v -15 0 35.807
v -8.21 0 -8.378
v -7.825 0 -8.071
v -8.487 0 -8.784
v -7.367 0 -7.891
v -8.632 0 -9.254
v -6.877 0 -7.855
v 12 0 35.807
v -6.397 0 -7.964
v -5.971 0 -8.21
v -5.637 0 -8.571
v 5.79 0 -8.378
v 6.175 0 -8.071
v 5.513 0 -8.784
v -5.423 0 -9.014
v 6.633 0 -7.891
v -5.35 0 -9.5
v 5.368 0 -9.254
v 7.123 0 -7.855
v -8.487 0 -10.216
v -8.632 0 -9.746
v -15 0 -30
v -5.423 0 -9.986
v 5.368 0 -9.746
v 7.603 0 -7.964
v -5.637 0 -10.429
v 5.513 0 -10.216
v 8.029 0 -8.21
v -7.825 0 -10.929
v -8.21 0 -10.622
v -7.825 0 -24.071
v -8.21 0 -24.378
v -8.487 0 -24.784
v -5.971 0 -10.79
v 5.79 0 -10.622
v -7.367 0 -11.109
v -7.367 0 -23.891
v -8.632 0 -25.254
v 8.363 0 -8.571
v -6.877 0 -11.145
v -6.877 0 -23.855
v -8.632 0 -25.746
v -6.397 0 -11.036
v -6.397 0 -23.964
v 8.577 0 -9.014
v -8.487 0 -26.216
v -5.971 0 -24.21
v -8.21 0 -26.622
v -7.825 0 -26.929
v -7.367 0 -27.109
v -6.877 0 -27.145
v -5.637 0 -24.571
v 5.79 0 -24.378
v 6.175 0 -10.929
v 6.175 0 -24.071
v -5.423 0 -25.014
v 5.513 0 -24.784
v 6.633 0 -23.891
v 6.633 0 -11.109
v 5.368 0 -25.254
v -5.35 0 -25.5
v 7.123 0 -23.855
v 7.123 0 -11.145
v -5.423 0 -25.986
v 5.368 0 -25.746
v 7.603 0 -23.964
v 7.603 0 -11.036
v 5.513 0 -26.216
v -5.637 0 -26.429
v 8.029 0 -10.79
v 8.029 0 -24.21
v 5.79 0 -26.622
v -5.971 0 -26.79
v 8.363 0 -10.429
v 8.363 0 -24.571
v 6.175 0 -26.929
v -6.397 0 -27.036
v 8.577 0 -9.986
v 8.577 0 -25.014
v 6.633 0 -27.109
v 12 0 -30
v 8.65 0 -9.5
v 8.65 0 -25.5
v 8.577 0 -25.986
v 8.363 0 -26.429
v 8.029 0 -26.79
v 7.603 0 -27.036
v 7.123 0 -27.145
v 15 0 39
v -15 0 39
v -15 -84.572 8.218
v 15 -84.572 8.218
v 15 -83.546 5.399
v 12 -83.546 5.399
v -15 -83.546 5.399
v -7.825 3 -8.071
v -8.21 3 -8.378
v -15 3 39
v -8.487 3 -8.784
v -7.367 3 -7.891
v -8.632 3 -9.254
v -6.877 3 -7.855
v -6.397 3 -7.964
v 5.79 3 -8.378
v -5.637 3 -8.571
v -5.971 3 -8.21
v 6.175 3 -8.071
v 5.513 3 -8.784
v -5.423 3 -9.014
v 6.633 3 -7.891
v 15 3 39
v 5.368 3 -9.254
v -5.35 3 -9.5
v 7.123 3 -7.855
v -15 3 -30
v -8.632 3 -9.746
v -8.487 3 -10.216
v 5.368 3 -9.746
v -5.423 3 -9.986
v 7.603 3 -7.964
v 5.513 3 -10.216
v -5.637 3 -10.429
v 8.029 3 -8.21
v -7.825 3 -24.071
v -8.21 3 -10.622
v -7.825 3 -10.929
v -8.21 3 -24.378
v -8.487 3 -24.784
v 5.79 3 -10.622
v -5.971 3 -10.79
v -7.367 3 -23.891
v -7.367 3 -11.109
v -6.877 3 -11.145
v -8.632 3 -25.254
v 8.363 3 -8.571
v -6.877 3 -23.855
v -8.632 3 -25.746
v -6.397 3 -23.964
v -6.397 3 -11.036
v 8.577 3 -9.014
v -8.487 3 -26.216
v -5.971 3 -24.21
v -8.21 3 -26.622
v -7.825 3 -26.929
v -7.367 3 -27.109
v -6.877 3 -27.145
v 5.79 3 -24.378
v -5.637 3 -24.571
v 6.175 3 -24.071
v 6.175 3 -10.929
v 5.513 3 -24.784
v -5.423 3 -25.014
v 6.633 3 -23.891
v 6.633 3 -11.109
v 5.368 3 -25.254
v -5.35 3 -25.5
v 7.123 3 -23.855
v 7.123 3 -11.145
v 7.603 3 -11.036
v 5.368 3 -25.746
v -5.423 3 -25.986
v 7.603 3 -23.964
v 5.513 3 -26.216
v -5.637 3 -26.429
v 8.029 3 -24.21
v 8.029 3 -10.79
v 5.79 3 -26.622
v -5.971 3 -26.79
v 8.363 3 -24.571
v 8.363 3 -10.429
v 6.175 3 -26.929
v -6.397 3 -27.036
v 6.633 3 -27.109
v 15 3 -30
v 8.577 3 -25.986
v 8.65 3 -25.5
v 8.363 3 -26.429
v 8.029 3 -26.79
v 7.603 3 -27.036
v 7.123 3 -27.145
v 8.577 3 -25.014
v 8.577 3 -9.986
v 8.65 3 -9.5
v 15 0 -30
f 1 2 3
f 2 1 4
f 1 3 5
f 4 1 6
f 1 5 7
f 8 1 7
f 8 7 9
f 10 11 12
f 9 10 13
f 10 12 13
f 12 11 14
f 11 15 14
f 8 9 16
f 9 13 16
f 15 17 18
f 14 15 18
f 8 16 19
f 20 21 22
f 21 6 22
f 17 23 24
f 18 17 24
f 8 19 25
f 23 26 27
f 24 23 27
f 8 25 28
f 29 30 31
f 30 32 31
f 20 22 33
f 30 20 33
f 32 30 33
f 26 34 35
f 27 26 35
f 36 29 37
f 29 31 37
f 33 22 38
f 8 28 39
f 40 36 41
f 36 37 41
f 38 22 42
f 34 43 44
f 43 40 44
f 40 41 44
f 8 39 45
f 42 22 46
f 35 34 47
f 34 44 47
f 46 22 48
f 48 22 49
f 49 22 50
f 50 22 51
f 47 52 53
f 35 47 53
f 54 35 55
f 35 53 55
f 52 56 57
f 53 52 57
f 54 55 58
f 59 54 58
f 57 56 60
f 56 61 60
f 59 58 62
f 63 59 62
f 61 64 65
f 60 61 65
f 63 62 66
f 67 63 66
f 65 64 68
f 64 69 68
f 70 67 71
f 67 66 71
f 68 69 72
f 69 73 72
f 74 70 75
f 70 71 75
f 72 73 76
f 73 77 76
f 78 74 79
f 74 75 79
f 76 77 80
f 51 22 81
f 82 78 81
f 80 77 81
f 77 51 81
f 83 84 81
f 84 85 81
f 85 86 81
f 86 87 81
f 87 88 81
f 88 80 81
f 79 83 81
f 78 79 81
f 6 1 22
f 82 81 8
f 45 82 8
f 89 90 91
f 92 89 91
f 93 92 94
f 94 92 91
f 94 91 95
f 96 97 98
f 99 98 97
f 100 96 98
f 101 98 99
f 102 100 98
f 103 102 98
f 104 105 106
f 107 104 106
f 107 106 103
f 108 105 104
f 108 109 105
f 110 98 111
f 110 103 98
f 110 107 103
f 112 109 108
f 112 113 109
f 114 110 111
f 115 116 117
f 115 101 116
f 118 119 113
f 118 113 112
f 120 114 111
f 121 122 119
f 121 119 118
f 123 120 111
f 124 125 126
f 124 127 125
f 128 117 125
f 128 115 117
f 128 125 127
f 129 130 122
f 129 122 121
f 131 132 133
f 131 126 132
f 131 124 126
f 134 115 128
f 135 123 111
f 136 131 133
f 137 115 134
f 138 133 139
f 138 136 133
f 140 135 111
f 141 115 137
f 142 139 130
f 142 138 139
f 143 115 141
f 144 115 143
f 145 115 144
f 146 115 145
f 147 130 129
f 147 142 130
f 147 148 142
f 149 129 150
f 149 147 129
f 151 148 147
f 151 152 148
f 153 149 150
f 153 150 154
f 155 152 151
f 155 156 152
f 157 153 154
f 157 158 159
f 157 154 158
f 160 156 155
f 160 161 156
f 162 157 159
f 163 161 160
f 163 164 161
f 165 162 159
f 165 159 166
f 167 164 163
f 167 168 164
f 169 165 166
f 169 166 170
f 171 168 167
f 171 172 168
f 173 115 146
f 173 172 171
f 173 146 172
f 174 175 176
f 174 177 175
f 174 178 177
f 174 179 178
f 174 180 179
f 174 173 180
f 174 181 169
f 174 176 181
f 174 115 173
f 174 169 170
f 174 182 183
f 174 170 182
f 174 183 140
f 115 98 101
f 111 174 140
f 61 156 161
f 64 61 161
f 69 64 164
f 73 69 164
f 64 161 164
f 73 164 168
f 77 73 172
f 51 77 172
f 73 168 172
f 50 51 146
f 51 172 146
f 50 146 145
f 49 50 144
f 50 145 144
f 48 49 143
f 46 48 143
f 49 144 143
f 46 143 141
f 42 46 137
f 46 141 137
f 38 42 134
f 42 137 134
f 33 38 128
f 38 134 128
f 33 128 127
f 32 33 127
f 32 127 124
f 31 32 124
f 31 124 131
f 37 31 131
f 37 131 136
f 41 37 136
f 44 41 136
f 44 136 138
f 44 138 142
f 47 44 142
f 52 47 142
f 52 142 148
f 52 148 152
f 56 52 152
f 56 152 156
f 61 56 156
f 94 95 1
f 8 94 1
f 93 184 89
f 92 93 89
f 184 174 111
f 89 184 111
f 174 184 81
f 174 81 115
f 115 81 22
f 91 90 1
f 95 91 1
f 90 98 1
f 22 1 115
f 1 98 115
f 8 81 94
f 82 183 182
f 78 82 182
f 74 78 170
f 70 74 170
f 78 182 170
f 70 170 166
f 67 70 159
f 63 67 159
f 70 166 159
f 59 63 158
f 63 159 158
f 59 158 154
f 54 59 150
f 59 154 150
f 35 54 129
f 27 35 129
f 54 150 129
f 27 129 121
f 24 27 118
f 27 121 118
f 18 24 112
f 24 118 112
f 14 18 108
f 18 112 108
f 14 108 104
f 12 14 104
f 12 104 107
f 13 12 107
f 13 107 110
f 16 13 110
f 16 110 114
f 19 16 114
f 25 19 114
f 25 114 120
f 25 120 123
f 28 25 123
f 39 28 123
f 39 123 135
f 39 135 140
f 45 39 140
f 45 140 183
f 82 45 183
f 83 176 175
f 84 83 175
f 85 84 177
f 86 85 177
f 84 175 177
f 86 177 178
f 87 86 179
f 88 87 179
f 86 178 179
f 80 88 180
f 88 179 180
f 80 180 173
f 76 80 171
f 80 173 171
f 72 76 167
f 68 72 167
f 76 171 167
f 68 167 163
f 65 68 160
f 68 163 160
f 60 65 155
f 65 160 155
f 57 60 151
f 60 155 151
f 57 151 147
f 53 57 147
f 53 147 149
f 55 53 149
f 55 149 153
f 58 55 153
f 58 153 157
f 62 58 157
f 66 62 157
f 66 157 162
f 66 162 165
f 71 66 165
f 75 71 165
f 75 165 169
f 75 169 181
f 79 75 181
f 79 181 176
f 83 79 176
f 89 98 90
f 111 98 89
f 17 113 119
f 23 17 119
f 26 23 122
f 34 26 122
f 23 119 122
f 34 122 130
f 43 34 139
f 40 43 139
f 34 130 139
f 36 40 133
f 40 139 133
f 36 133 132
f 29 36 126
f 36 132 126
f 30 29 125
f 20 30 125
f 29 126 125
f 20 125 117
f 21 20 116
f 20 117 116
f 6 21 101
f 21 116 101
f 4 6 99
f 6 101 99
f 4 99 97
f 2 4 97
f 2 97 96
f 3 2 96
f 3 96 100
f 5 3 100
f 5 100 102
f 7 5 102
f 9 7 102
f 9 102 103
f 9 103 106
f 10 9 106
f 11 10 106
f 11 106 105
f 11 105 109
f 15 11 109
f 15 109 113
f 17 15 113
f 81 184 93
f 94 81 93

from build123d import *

# Parameters (mm, degrees)
BOSS_EXTRUDE1_DEPTH = 3
SKETCH2_R           = 1.65
CUT_EXTRUDE1_DEPTH  = 4
SKETCH3_W           = 30
SKETCH3_H           = 3
BOSS_EXTRUDE2_DEPTH = 8
BOSS_EXTRUDE3_DEPTH = 30
BOSS_EXTRUDE4_DEPTH = 3


with BuildPart() as part:
    # Sketch1 → Boss-Extrude1 (new body)
    with BuildSketch(Plane(origin=(0, 0, 0), x_dir=(1, 0, 0), z_dir=(0, 1, 0))):
        Polygon((15, -28), (15, 30), (-15, 30), (-15, -28), (-15, -31), (15, -31), align=None)
    extrude(amount=BOSS_EXTRUDE1_DEPTH)

    # Sketch2 → Cut-Extrude1 (cut)
    with BuildSketch(Plane(origin=(0, 3, 0), x_dir=(1, 0, 0), z_dir=(0, 1, 0))):
        with Locations((-7, 25.5)):
            Circle(SKETCH2_R)
        with Locations((7, 25.5)):
            Circle(SKETCH2_R)
        with Locations((-7, 9.5)):
            Circle(SKETCH2_R)
        with Locations((7, 9.5)):
            Circle(SKETCH2_R)
    extrude(amount=-CUT_EXTRUDE1_DEPTH, mode=Mode.SUBTRACT)

    # Sketch3 → Boss-Extrude2 (add)
    with BuildSketch(Plane.XY.offset(31)):
        with Locations((0, 1.5)):
            Rectangle(SKETCH3_W, SKETCH3_H)
    extrude(amount=BOSS_EXTRUDE2_DEPTH)

    # Sketch5 → Boss-Extrude3 (add)
    with BuildSketch(Plane.ZY.offset(15)):
        Polygon((39, 0), (8.218187101, -84.572335871), (5.399109238, -83.546275441), (35.807466683, 0), align=None)
    extrude(amount=-BOSS_EXTRUDE3_DEPTH)

    # Sketch6 → Boss-Extrude4 (add)
    with BuildSketch(Plane(origin=(15, 0, 0), x_dir=(0, 0, -1), z_dir=(1, 0, 0))):
        Polygon((30, 0), (-5.399109238, -83.546275441), (-8.218187101, -84.572335871), (-39, 0), (-39, 3), (30, 3), align=None)
    extrude(amount=-BOSS_EXTRUDE4_DEPTH)


solid = part.part
